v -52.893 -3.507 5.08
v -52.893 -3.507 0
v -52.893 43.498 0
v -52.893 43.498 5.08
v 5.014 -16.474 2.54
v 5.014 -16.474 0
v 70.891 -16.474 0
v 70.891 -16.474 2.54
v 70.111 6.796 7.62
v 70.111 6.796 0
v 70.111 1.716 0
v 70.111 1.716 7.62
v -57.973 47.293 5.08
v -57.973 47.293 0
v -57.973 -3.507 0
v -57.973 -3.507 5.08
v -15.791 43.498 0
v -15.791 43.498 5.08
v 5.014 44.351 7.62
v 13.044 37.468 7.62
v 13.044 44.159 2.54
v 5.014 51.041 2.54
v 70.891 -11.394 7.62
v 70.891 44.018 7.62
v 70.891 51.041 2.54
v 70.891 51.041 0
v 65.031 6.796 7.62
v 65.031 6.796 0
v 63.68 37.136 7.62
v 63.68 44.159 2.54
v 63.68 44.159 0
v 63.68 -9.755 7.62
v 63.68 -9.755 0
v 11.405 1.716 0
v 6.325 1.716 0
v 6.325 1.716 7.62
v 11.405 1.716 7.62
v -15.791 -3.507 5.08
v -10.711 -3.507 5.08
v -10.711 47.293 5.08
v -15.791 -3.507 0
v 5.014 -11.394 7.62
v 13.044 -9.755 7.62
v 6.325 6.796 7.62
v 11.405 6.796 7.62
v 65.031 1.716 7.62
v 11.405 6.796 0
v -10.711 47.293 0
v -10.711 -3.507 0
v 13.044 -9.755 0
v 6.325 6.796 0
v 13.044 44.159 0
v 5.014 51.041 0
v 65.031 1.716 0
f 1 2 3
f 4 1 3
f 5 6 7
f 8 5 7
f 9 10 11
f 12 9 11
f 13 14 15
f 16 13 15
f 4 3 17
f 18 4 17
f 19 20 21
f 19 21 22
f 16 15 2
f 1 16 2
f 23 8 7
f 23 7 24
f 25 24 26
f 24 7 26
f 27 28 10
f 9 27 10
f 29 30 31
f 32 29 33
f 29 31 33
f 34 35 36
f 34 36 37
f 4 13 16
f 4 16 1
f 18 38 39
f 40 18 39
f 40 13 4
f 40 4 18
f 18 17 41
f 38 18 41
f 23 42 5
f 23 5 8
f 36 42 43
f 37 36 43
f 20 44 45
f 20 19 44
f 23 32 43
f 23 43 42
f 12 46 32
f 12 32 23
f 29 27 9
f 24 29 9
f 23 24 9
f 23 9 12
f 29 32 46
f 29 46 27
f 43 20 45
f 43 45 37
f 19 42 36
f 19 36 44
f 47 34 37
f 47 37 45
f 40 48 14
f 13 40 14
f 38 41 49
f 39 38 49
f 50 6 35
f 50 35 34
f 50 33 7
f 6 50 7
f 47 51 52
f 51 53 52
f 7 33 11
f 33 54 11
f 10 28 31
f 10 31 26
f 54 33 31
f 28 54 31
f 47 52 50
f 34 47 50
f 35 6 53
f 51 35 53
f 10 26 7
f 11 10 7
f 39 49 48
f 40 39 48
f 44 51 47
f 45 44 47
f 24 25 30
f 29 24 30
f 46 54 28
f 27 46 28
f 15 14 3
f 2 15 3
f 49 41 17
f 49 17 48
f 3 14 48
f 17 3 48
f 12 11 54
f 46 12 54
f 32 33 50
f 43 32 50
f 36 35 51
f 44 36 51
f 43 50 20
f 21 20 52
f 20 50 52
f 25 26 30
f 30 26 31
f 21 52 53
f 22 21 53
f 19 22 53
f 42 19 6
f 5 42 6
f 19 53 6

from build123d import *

# Parameters (mm, degrees)
F0_W     = 37.1021415129
F0_H     = 3.7951407298
F1_DEPTH = 5.08
F2_W     = 5.08
F2_H     = 5.08
F3_DEPTH = 7.62
F4_SIZE  = 5.08


with BuildPart() as f1:
    # F0 (on Top) → F1 (new body)
    with BuildSketch(Plane.XY):
        Polygon((-57.9732320131, 47.2929266557), (-57.9732320131, -3.5070733443), (-52.8932320131, -3.5070733443), (-52.8932320131, 43.4977859259), (-52.8932320131, 47.2929266557), align=None)
        Polygon((-15.7910905002, 47.2929266557), (-15.7910905002, 43.4977859259), (-15.7910905002, -3.5070733443), (-10.7110905002, -3.5070733443), (-10.7110905002, 47.2929266557), align=None)
        with Locations((-34.3421612567, 45.3953562908)):
            Rectangle(F0_W, F0_H)
    extrude(amount=F1_DEPTH)


with BuildPart() as f3:
    # F2 (on Top) → F3 (new body)
    with BuildSketch(Plane.XY):
        Polygon((70.8905990372, 1.7161462436), (70.8905990372, 51.0413096702), (63.6802796012, 44.1587287516), (63.6802796012, 1.7161462436), (65.0306269526, 1.7161462436), (65.0306269526, 6.7961462436), (70.1106269526, 6.7961462436), (70.1106269526, 1.7161462436), align=None)
        Polygon((13.0441530983, 44.1587287516), (5.0144725343, 51.0413096702), (5.0144725343, -16.4735316714), (70.8905990372, -16.4735316714), (70.8905990372, 1.7161462436), (70.1106269526, 1.7161462436), (65.0306269526, 1.7161462436), (63.6802796012, 1.7161462436), (63.6802796012, -9.7548216009), (13.0441530983, -9.7548216009), (13.0441530983, 1.7161462436), align=None)
        with Locations((8.8654414384, 4.2561462436)):
            Rectangle(F2_W, F2_H, mode=Mode.SUBTRACT)
    extrude(amount=F3_DEPTH)

    # F4
    f4_edges = [f3.edges().sort_by_distance(p)[0] for p in [
        (37.952536, -16.473532, 7.62),
        (9.029313, 47.600019, 7.62),
        (67.285439, 47.600019, 7.62),
    ]]
    chamfer(f4_edges, length=F4_SIZE)


solid = Compound([f1.part, f3.part])
